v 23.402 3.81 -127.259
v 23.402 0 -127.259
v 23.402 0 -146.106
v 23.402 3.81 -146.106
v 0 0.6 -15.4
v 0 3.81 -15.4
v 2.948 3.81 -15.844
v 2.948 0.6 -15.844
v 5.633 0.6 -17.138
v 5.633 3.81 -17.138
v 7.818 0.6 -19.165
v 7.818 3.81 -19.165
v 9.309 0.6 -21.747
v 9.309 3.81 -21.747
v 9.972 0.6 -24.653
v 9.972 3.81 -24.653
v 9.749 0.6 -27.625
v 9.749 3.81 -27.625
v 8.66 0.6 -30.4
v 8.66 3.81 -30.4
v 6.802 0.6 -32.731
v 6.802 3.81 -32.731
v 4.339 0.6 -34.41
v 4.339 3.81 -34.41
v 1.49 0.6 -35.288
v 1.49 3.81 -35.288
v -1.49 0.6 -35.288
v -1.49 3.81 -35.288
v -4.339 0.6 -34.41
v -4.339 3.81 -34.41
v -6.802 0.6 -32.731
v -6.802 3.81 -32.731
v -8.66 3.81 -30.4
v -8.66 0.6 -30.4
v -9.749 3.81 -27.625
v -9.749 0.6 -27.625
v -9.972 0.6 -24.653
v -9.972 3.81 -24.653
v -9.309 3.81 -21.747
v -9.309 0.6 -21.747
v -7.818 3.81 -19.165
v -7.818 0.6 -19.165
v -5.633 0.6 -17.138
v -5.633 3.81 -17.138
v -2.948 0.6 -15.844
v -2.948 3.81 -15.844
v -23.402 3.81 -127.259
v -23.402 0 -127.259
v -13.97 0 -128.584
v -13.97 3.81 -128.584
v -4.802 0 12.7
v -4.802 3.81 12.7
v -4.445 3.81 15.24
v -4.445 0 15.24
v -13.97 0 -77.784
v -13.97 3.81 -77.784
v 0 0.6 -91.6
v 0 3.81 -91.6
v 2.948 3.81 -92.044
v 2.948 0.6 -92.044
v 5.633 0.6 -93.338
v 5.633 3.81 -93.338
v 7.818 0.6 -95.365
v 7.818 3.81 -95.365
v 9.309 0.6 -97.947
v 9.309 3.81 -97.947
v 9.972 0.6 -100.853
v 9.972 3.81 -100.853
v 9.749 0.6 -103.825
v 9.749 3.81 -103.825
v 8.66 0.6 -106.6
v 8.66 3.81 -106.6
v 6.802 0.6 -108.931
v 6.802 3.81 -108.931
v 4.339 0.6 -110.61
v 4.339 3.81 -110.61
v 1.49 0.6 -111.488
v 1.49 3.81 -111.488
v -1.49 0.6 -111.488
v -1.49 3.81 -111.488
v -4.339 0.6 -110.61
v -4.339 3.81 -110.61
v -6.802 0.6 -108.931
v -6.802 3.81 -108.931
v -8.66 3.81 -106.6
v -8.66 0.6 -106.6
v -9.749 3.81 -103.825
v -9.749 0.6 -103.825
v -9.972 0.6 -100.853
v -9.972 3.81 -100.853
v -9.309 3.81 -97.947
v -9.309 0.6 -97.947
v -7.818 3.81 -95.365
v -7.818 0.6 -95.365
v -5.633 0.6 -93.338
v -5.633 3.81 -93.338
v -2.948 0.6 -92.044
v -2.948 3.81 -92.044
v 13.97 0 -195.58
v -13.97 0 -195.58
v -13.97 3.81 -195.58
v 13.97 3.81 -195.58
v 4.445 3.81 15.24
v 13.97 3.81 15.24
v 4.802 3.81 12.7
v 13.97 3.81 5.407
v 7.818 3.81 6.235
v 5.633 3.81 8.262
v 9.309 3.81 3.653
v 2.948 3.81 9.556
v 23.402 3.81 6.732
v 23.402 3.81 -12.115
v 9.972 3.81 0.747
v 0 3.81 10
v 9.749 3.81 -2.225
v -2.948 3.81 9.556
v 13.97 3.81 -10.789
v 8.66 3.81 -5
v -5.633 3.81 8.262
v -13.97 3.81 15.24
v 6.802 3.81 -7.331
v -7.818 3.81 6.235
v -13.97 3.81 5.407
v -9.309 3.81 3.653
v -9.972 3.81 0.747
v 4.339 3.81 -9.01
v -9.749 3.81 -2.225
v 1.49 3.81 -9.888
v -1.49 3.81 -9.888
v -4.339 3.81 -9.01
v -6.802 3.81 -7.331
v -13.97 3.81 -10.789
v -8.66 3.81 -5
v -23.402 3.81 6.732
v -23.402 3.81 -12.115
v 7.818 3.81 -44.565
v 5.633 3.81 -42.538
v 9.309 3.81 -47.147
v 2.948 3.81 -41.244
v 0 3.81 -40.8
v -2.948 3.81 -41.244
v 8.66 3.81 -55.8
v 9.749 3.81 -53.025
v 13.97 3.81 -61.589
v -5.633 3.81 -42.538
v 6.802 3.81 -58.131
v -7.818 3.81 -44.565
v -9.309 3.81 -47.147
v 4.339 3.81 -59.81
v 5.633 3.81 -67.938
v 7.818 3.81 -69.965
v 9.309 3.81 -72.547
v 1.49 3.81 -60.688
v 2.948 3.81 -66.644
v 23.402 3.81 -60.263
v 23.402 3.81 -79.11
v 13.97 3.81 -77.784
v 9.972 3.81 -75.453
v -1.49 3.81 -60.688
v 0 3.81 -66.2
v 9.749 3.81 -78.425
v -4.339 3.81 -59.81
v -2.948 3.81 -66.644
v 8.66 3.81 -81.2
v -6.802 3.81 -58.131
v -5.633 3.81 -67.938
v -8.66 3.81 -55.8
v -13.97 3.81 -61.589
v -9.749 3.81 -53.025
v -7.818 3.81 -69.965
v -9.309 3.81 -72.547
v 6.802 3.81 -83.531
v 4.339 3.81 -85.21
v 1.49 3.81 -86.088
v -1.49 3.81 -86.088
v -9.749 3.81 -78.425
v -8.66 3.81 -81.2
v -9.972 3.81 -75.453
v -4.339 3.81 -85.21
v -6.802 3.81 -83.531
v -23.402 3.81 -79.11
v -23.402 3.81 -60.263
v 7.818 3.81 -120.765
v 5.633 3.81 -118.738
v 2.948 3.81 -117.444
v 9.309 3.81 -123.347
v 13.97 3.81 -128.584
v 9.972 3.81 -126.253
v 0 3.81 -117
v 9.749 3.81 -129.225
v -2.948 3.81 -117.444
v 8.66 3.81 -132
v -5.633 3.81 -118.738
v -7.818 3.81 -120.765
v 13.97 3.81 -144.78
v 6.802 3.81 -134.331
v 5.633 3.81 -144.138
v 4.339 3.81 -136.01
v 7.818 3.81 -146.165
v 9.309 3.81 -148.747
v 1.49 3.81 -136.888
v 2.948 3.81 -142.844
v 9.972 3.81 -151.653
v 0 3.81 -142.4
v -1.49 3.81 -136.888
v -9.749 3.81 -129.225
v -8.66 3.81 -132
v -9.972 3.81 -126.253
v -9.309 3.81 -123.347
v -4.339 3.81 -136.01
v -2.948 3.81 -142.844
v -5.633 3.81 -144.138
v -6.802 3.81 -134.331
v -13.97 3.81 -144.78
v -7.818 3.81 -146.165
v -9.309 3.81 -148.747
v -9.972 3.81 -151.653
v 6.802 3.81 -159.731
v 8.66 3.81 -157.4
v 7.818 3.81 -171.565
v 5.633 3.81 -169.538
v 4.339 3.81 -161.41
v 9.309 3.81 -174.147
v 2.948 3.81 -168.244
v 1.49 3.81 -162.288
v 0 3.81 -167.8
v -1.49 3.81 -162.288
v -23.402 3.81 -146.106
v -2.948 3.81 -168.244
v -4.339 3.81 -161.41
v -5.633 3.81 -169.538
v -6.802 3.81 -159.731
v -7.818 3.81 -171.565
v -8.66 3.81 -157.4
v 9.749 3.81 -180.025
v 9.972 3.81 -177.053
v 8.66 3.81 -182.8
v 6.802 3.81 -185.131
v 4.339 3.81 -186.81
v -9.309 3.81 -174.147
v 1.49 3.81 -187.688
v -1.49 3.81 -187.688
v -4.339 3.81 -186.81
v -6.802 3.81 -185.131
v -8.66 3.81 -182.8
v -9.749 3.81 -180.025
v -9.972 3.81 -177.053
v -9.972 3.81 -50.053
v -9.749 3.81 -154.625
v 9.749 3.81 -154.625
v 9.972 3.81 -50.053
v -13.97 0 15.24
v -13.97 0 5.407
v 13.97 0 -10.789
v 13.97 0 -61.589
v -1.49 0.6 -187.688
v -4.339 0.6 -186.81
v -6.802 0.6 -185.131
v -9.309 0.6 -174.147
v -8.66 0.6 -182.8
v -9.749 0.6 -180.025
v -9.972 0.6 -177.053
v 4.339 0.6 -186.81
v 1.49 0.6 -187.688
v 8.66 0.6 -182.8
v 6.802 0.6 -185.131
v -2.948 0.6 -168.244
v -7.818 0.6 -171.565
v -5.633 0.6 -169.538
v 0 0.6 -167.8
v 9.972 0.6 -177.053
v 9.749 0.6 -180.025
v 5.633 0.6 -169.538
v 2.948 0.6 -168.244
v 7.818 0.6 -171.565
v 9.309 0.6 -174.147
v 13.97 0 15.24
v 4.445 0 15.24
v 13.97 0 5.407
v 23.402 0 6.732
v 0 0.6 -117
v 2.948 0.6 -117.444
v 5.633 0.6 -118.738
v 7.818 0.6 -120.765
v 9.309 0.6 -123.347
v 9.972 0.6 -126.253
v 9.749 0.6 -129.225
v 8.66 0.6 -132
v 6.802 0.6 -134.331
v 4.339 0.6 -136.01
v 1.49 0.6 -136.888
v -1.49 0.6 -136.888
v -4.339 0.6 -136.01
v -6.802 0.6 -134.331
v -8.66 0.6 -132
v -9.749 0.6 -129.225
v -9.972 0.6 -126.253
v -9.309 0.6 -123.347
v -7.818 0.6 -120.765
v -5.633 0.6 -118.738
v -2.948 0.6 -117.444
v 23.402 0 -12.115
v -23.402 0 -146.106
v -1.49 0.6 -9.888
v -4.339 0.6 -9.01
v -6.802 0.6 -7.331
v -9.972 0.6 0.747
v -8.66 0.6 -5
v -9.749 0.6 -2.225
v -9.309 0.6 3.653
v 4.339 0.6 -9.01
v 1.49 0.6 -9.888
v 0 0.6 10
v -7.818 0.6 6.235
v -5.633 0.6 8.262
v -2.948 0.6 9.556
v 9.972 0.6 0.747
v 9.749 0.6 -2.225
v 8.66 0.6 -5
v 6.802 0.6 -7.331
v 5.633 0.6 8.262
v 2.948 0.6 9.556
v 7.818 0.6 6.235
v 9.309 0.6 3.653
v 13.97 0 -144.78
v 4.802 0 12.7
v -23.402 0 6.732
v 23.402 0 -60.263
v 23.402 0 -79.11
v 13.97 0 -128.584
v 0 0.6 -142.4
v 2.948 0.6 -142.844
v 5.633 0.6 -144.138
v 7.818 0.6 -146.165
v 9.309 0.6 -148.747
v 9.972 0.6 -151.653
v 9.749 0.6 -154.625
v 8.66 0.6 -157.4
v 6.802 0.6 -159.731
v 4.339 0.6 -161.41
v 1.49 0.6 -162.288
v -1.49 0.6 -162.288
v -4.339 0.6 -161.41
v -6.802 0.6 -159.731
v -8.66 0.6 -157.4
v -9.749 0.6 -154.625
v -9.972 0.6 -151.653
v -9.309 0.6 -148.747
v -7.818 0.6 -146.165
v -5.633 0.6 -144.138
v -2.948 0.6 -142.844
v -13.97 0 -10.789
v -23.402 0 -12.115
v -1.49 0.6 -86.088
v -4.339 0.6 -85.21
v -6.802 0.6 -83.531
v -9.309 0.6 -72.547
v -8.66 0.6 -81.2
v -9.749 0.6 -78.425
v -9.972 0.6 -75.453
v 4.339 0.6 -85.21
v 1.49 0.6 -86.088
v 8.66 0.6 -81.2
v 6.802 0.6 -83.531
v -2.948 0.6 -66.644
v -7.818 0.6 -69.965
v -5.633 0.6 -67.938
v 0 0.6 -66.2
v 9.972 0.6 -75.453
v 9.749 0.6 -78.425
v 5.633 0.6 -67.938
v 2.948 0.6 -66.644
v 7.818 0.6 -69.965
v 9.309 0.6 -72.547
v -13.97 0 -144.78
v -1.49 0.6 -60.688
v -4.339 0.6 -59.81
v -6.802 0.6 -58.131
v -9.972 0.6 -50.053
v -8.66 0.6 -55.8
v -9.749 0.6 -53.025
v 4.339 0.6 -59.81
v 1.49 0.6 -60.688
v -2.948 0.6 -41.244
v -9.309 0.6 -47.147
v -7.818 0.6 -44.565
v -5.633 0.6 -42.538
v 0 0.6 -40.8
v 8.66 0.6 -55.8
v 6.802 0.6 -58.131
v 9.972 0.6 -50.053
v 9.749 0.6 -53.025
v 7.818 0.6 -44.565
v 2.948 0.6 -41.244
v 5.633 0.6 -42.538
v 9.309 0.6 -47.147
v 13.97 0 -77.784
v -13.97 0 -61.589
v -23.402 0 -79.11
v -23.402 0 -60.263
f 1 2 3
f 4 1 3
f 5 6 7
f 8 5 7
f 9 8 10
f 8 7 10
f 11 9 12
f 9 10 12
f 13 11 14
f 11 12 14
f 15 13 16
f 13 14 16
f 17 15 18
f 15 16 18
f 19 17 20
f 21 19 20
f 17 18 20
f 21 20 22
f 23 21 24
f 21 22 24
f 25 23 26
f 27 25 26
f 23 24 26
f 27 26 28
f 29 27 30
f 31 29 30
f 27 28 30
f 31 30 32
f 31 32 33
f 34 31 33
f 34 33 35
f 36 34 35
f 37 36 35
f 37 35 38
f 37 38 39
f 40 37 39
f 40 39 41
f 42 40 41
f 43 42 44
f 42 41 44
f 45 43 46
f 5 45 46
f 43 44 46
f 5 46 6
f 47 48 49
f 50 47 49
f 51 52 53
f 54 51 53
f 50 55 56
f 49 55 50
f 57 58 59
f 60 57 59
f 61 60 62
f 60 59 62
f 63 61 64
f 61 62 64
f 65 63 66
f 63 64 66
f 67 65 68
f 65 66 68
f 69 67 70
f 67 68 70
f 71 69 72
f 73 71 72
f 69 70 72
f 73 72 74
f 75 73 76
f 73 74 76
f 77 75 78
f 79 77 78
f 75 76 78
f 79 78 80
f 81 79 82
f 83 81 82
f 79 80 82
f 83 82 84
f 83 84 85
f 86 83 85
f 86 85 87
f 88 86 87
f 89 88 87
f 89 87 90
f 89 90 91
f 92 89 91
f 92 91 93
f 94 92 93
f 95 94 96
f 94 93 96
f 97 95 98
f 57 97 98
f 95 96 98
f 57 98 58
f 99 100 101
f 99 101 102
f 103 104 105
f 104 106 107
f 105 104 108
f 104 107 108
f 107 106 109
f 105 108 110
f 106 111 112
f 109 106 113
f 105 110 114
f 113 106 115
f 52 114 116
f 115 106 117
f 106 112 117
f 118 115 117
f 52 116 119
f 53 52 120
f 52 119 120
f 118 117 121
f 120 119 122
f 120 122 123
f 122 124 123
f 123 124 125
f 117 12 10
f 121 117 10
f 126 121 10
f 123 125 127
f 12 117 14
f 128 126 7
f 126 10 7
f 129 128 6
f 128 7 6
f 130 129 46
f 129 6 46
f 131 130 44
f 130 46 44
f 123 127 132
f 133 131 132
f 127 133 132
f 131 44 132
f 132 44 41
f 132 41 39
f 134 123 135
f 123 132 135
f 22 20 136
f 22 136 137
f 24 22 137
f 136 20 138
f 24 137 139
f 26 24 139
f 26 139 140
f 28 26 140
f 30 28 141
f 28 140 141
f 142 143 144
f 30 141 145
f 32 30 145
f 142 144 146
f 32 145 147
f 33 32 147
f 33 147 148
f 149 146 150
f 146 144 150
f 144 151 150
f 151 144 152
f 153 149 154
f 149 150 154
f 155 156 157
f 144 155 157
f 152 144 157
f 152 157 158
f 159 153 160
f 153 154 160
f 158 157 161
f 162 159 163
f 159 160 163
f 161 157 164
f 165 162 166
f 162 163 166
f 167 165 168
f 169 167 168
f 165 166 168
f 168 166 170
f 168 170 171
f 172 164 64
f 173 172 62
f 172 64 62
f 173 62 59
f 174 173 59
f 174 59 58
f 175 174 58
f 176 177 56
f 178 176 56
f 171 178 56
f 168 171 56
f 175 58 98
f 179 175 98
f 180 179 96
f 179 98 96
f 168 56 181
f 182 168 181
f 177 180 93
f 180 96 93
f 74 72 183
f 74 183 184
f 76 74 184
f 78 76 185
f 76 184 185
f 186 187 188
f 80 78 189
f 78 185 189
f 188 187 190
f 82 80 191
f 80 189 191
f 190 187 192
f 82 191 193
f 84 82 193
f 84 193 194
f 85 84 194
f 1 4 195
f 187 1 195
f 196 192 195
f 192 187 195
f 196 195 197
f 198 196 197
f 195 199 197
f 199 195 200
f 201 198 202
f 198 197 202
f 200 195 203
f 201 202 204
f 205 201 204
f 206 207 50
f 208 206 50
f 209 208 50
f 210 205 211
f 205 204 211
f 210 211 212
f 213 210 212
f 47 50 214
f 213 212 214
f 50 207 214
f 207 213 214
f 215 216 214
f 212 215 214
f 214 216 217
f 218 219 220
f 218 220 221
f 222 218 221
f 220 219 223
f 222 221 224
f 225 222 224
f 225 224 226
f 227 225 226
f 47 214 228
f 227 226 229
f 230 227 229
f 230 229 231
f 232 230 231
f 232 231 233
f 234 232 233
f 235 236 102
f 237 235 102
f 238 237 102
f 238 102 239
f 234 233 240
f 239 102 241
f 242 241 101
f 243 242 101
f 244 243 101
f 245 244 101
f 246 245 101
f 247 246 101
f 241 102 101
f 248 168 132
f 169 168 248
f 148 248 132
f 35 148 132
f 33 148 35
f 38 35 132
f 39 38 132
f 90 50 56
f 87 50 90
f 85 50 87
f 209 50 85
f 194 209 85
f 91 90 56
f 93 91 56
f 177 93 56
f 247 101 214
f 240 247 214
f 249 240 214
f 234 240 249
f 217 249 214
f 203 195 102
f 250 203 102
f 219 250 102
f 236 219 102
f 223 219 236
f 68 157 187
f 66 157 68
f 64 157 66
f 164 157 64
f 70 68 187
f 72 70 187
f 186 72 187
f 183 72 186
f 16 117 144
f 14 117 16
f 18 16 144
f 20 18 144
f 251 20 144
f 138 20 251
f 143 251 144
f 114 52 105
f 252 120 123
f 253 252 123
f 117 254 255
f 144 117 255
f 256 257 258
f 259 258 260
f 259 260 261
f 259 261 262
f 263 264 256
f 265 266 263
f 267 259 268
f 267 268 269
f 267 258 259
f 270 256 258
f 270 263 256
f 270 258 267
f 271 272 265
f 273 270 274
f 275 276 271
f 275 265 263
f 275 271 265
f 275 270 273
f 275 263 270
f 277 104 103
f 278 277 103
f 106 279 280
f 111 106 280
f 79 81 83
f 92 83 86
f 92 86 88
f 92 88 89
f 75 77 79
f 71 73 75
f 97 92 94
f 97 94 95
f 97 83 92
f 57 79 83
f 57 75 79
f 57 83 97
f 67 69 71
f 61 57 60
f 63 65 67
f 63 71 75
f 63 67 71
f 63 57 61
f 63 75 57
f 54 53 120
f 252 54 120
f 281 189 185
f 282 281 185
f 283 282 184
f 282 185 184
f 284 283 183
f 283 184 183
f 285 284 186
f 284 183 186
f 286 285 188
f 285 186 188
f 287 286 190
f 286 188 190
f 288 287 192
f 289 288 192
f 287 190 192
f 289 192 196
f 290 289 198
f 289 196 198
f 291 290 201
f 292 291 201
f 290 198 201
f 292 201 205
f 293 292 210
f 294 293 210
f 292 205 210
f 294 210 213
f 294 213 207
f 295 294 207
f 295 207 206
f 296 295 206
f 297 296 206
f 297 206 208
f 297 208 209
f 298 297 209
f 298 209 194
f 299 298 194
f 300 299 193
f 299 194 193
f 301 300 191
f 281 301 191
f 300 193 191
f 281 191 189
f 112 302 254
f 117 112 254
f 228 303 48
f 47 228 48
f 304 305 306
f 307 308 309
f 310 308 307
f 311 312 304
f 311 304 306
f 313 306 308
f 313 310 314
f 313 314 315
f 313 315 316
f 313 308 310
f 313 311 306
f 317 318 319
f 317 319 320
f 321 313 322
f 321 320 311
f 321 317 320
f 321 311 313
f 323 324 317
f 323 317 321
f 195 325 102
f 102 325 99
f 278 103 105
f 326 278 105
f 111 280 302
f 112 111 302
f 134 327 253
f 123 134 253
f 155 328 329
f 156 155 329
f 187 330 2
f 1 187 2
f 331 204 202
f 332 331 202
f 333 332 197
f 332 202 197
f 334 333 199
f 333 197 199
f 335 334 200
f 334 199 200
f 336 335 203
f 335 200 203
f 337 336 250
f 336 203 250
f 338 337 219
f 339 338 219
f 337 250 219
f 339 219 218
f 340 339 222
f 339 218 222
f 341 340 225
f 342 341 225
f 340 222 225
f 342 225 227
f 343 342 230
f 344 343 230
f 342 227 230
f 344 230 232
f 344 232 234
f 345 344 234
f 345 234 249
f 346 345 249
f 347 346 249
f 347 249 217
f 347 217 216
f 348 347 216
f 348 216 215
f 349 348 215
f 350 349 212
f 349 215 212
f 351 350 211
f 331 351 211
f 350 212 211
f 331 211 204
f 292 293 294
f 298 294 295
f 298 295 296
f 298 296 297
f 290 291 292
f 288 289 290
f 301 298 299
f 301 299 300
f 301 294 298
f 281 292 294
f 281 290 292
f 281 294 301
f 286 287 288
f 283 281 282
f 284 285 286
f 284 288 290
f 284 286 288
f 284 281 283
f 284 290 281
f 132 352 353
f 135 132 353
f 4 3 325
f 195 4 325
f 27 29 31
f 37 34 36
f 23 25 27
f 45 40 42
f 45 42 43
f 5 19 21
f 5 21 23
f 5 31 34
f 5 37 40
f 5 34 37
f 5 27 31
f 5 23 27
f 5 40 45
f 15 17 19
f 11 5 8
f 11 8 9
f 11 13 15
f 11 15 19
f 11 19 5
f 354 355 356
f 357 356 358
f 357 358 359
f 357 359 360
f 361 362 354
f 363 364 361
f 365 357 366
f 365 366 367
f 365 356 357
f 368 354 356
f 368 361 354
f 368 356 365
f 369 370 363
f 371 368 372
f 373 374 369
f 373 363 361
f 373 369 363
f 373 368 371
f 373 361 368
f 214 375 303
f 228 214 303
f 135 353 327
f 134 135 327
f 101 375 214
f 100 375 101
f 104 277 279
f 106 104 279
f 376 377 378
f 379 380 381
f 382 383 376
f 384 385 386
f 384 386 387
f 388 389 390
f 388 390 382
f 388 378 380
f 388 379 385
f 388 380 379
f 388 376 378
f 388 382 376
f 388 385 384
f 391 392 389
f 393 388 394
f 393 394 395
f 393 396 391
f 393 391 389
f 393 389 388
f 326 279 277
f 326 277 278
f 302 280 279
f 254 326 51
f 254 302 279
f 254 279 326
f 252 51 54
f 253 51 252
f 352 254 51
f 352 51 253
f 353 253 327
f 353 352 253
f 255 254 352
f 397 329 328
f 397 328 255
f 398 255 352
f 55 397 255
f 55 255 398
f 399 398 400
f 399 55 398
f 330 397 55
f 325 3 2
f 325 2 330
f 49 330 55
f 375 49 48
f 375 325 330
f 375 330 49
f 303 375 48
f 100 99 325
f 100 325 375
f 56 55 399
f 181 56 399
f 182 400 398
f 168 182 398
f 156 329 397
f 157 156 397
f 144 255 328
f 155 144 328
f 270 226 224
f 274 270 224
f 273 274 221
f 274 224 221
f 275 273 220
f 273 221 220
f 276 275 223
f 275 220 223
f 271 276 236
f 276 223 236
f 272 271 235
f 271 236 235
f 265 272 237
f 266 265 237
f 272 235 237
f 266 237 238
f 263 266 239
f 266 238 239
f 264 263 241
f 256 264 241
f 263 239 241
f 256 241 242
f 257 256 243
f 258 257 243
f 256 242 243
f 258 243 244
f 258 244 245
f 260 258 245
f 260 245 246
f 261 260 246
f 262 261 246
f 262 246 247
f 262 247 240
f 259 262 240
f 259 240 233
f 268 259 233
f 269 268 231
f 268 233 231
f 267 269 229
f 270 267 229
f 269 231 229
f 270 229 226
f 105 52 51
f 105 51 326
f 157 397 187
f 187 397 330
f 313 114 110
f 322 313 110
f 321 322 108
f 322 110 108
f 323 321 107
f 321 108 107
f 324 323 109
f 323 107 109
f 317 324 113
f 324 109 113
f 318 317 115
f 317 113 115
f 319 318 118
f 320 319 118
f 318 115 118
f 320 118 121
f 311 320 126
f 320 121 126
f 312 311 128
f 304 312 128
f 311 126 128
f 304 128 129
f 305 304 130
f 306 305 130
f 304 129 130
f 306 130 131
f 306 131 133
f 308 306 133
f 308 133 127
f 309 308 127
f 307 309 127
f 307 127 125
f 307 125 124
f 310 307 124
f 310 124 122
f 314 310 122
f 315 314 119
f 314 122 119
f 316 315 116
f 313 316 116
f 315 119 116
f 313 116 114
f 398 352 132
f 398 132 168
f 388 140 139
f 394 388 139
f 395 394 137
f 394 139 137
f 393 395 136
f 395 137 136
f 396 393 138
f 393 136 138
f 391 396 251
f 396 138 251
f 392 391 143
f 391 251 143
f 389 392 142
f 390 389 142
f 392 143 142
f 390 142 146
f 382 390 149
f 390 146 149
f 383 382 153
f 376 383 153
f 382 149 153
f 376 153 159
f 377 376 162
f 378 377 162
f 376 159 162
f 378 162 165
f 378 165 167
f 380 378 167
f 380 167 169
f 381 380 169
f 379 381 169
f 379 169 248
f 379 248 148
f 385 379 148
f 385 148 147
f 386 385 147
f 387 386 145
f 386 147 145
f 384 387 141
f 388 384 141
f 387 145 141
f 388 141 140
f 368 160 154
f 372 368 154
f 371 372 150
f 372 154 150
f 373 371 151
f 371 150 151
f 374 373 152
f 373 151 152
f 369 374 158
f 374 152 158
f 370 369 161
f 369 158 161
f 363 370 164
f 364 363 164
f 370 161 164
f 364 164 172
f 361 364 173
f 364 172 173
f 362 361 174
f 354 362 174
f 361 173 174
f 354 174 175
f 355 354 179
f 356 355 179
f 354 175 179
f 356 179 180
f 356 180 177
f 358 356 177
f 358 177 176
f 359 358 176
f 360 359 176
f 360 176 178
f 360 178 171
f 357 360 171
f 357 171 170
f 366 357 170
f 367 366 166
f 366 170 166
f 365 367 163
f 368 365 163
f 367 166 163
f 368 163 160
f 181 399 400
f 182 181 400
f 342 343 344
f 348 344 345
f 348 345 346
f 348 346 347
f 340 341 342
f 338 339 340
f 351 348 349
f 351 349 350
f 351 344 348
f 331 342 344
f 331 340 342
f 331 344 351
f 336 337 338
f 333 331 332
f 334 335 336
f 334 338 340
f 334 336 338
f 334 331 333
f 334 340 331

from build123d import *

# Parameters (mm, degrees)
SKETCH1_W           = 27.94
SKETCH1_H           = 391.16
BOSS_EXTRUDE1_DEPTH = 3.81
SKETCH2_R           = 10
CUT_EXTRUDE1_DEPTH  = 3.21
BOSS_EXTRUDE2_DEPTH = 3.81
SKETCH5_W           = 46.80460671
SKETCH5_H           = 4.064
CUT_EXTRUDE2_DEPTH  = 182.88
BOSS_EXTRUDE3_DEPTH = 3.81


with BuildPart() as part:
    # Sketch1 → Boss-Extrude1 (new body)
    with BuildSketch(Plane(origin=(0, 0, 0), x_dir=(1, 0, 0), z_dir=(0, 1, 0))):
        Rectangle(SKETCH1_W, SKETCH1_H)
    extrude(amount=BOSS_EXTRUDE1_DEPTH)

    # Sketch2 → Cut-Extrude1 (cut)
    with BuildSketch(Plane(origin=(0, 3.81, 0), x_dir=(1, 0, 0), z_dir=(0, 1, 0))):
        with Locations((0, 177.8)):
            Circle(SKETCH2_R)
        with Locations((0, 152.4)):
            Circle(SKETCH2_R)
        with Locations((0, 127)):
            Circle(SKETCH2_R)
        with Locations((0, 101.6)):
            Circle(SKETCH2_R)
        with Locations((0, 76.2)):
            Circle(SKETCH2_R)
        with Locations((0, 50.8)):
            Circle(SKETCH2_R)
        with Locations((0, 25.4)):
            Circle(SKETCH2_R)
        Circle(SKETCH2_R)
        with Locations((0, -25.4)):
            Circle(SKETCH2_R)
        with Locations((0, -50.8)):
            Circle(SKETCH2_R)
        with Locations((0, -76.2)):
            Circle(SKETCH2_R)
        with Locations((0, -101.6)):
            Circle(SKETCH2_R)
        with Locations((0, -127)):
            Circle(SKETCH2_R)
        with Locations((0, -152.4)):
            Circle(SKETCH2_R)
        with Locations((0, -177.8)):
            Circle(SKETCH2_R)
    extrude(amount=-CUT_EXTRUDE1_DEPTH, mode=Mode.SUBTRACT)

    # Sketch4 → Boss-Extrude2 (add)
    with BuildSketch(Plane(origin=(0, 0, 0), x_dir=(1, 0, 0), z_dir=(0, 1, 0))):
        Polygon((23.402303355, -54.881033493), (13.97, -56.20665728), (13.97, -72.402209707), (23.402303355, -73.727833493), align=None)
        Polygon((23.402303355, 146.105623787), (13.97, 144.78), (13.97, 128.584447573), (23.402303355, 127.258823787), align=None)
        Polygon((-13.97, 128.584447573), (-13.97, 144.78), (-23.402303355, 146.105623787), (-23.402303355, 127.258823787), align=None)
        Polygon((23.402303355, 79.11007136), (13.97, 77.784447573), (13.97, 61.588895147), (23.402303355, 60.26327136), align=None)
        Polygon((23.402303355, 12.114518933), (13.97, 10.788895147), (13.97, -5.40665728), (23.402303355, -6.732281067), align=None)
        Polygon((-13.97, -5.40665728), (-13.97, 10.788895147), (-23.402303355, 12.114518933), (-23.402303355, -6.732281067), align=None)
        Polygon((-13.97, 61.588895147), (-13.97, 77.784447573), (-23.402303355, 79.11007136), (-23.402303355, 60.26327136), align=None)
        Polygon((23.402303355, -121.87658592), (13.97, -123.202209707), (13.97, -139.397762134), (23.402303355, -140.72338592), align=None)
        Polygon((-13.97, -139.397762134), (-13.97, -123.202209707), (-23.402303355, -121.87658592), (-23.402303355, -140.72338592), align=None)
        Polygon((-13.97, -72.402209707), (-13.97, -56.20665728), (-23.402303355, -54.881033493), (-23.402303355, -73.727833493), align=None)
    extrude(amount=BOSS_EXTRUDE2_DEPTH)

    # Sketch5 → Cut-Extrude2 (cut)
    with BuildSketch(Plane.XY.offset(195.58)):
        with Locations((0, 2.032)):
            Rectangle(SKETCH5_W, SKETCH5_H)
    extrude(amount=-CUT_EXTRUDE2_DEPTH, mode=Mode.SUBTRACT)

    # Sketch6 → Boss-Extrude3 (add)
    with BuildSketch(Plane(origin=(0, 3.81, 0), x_dir=(1, 0, 0), z_dir=(0, 1, 0))):
        Polygon((-4.80197372, -12.7), (-4.445, -15.24), (-13.97, -15.24), (-13.97, -12.7), align=None)
        Polygon((13.97, -12.7), (13.97, -15.24), (4.445, -15.24), (4.80197372, -12.7), align=None)
    extrude(amount=-BOSS_EXTRUDE3_DEPTH)


solid = part.part
